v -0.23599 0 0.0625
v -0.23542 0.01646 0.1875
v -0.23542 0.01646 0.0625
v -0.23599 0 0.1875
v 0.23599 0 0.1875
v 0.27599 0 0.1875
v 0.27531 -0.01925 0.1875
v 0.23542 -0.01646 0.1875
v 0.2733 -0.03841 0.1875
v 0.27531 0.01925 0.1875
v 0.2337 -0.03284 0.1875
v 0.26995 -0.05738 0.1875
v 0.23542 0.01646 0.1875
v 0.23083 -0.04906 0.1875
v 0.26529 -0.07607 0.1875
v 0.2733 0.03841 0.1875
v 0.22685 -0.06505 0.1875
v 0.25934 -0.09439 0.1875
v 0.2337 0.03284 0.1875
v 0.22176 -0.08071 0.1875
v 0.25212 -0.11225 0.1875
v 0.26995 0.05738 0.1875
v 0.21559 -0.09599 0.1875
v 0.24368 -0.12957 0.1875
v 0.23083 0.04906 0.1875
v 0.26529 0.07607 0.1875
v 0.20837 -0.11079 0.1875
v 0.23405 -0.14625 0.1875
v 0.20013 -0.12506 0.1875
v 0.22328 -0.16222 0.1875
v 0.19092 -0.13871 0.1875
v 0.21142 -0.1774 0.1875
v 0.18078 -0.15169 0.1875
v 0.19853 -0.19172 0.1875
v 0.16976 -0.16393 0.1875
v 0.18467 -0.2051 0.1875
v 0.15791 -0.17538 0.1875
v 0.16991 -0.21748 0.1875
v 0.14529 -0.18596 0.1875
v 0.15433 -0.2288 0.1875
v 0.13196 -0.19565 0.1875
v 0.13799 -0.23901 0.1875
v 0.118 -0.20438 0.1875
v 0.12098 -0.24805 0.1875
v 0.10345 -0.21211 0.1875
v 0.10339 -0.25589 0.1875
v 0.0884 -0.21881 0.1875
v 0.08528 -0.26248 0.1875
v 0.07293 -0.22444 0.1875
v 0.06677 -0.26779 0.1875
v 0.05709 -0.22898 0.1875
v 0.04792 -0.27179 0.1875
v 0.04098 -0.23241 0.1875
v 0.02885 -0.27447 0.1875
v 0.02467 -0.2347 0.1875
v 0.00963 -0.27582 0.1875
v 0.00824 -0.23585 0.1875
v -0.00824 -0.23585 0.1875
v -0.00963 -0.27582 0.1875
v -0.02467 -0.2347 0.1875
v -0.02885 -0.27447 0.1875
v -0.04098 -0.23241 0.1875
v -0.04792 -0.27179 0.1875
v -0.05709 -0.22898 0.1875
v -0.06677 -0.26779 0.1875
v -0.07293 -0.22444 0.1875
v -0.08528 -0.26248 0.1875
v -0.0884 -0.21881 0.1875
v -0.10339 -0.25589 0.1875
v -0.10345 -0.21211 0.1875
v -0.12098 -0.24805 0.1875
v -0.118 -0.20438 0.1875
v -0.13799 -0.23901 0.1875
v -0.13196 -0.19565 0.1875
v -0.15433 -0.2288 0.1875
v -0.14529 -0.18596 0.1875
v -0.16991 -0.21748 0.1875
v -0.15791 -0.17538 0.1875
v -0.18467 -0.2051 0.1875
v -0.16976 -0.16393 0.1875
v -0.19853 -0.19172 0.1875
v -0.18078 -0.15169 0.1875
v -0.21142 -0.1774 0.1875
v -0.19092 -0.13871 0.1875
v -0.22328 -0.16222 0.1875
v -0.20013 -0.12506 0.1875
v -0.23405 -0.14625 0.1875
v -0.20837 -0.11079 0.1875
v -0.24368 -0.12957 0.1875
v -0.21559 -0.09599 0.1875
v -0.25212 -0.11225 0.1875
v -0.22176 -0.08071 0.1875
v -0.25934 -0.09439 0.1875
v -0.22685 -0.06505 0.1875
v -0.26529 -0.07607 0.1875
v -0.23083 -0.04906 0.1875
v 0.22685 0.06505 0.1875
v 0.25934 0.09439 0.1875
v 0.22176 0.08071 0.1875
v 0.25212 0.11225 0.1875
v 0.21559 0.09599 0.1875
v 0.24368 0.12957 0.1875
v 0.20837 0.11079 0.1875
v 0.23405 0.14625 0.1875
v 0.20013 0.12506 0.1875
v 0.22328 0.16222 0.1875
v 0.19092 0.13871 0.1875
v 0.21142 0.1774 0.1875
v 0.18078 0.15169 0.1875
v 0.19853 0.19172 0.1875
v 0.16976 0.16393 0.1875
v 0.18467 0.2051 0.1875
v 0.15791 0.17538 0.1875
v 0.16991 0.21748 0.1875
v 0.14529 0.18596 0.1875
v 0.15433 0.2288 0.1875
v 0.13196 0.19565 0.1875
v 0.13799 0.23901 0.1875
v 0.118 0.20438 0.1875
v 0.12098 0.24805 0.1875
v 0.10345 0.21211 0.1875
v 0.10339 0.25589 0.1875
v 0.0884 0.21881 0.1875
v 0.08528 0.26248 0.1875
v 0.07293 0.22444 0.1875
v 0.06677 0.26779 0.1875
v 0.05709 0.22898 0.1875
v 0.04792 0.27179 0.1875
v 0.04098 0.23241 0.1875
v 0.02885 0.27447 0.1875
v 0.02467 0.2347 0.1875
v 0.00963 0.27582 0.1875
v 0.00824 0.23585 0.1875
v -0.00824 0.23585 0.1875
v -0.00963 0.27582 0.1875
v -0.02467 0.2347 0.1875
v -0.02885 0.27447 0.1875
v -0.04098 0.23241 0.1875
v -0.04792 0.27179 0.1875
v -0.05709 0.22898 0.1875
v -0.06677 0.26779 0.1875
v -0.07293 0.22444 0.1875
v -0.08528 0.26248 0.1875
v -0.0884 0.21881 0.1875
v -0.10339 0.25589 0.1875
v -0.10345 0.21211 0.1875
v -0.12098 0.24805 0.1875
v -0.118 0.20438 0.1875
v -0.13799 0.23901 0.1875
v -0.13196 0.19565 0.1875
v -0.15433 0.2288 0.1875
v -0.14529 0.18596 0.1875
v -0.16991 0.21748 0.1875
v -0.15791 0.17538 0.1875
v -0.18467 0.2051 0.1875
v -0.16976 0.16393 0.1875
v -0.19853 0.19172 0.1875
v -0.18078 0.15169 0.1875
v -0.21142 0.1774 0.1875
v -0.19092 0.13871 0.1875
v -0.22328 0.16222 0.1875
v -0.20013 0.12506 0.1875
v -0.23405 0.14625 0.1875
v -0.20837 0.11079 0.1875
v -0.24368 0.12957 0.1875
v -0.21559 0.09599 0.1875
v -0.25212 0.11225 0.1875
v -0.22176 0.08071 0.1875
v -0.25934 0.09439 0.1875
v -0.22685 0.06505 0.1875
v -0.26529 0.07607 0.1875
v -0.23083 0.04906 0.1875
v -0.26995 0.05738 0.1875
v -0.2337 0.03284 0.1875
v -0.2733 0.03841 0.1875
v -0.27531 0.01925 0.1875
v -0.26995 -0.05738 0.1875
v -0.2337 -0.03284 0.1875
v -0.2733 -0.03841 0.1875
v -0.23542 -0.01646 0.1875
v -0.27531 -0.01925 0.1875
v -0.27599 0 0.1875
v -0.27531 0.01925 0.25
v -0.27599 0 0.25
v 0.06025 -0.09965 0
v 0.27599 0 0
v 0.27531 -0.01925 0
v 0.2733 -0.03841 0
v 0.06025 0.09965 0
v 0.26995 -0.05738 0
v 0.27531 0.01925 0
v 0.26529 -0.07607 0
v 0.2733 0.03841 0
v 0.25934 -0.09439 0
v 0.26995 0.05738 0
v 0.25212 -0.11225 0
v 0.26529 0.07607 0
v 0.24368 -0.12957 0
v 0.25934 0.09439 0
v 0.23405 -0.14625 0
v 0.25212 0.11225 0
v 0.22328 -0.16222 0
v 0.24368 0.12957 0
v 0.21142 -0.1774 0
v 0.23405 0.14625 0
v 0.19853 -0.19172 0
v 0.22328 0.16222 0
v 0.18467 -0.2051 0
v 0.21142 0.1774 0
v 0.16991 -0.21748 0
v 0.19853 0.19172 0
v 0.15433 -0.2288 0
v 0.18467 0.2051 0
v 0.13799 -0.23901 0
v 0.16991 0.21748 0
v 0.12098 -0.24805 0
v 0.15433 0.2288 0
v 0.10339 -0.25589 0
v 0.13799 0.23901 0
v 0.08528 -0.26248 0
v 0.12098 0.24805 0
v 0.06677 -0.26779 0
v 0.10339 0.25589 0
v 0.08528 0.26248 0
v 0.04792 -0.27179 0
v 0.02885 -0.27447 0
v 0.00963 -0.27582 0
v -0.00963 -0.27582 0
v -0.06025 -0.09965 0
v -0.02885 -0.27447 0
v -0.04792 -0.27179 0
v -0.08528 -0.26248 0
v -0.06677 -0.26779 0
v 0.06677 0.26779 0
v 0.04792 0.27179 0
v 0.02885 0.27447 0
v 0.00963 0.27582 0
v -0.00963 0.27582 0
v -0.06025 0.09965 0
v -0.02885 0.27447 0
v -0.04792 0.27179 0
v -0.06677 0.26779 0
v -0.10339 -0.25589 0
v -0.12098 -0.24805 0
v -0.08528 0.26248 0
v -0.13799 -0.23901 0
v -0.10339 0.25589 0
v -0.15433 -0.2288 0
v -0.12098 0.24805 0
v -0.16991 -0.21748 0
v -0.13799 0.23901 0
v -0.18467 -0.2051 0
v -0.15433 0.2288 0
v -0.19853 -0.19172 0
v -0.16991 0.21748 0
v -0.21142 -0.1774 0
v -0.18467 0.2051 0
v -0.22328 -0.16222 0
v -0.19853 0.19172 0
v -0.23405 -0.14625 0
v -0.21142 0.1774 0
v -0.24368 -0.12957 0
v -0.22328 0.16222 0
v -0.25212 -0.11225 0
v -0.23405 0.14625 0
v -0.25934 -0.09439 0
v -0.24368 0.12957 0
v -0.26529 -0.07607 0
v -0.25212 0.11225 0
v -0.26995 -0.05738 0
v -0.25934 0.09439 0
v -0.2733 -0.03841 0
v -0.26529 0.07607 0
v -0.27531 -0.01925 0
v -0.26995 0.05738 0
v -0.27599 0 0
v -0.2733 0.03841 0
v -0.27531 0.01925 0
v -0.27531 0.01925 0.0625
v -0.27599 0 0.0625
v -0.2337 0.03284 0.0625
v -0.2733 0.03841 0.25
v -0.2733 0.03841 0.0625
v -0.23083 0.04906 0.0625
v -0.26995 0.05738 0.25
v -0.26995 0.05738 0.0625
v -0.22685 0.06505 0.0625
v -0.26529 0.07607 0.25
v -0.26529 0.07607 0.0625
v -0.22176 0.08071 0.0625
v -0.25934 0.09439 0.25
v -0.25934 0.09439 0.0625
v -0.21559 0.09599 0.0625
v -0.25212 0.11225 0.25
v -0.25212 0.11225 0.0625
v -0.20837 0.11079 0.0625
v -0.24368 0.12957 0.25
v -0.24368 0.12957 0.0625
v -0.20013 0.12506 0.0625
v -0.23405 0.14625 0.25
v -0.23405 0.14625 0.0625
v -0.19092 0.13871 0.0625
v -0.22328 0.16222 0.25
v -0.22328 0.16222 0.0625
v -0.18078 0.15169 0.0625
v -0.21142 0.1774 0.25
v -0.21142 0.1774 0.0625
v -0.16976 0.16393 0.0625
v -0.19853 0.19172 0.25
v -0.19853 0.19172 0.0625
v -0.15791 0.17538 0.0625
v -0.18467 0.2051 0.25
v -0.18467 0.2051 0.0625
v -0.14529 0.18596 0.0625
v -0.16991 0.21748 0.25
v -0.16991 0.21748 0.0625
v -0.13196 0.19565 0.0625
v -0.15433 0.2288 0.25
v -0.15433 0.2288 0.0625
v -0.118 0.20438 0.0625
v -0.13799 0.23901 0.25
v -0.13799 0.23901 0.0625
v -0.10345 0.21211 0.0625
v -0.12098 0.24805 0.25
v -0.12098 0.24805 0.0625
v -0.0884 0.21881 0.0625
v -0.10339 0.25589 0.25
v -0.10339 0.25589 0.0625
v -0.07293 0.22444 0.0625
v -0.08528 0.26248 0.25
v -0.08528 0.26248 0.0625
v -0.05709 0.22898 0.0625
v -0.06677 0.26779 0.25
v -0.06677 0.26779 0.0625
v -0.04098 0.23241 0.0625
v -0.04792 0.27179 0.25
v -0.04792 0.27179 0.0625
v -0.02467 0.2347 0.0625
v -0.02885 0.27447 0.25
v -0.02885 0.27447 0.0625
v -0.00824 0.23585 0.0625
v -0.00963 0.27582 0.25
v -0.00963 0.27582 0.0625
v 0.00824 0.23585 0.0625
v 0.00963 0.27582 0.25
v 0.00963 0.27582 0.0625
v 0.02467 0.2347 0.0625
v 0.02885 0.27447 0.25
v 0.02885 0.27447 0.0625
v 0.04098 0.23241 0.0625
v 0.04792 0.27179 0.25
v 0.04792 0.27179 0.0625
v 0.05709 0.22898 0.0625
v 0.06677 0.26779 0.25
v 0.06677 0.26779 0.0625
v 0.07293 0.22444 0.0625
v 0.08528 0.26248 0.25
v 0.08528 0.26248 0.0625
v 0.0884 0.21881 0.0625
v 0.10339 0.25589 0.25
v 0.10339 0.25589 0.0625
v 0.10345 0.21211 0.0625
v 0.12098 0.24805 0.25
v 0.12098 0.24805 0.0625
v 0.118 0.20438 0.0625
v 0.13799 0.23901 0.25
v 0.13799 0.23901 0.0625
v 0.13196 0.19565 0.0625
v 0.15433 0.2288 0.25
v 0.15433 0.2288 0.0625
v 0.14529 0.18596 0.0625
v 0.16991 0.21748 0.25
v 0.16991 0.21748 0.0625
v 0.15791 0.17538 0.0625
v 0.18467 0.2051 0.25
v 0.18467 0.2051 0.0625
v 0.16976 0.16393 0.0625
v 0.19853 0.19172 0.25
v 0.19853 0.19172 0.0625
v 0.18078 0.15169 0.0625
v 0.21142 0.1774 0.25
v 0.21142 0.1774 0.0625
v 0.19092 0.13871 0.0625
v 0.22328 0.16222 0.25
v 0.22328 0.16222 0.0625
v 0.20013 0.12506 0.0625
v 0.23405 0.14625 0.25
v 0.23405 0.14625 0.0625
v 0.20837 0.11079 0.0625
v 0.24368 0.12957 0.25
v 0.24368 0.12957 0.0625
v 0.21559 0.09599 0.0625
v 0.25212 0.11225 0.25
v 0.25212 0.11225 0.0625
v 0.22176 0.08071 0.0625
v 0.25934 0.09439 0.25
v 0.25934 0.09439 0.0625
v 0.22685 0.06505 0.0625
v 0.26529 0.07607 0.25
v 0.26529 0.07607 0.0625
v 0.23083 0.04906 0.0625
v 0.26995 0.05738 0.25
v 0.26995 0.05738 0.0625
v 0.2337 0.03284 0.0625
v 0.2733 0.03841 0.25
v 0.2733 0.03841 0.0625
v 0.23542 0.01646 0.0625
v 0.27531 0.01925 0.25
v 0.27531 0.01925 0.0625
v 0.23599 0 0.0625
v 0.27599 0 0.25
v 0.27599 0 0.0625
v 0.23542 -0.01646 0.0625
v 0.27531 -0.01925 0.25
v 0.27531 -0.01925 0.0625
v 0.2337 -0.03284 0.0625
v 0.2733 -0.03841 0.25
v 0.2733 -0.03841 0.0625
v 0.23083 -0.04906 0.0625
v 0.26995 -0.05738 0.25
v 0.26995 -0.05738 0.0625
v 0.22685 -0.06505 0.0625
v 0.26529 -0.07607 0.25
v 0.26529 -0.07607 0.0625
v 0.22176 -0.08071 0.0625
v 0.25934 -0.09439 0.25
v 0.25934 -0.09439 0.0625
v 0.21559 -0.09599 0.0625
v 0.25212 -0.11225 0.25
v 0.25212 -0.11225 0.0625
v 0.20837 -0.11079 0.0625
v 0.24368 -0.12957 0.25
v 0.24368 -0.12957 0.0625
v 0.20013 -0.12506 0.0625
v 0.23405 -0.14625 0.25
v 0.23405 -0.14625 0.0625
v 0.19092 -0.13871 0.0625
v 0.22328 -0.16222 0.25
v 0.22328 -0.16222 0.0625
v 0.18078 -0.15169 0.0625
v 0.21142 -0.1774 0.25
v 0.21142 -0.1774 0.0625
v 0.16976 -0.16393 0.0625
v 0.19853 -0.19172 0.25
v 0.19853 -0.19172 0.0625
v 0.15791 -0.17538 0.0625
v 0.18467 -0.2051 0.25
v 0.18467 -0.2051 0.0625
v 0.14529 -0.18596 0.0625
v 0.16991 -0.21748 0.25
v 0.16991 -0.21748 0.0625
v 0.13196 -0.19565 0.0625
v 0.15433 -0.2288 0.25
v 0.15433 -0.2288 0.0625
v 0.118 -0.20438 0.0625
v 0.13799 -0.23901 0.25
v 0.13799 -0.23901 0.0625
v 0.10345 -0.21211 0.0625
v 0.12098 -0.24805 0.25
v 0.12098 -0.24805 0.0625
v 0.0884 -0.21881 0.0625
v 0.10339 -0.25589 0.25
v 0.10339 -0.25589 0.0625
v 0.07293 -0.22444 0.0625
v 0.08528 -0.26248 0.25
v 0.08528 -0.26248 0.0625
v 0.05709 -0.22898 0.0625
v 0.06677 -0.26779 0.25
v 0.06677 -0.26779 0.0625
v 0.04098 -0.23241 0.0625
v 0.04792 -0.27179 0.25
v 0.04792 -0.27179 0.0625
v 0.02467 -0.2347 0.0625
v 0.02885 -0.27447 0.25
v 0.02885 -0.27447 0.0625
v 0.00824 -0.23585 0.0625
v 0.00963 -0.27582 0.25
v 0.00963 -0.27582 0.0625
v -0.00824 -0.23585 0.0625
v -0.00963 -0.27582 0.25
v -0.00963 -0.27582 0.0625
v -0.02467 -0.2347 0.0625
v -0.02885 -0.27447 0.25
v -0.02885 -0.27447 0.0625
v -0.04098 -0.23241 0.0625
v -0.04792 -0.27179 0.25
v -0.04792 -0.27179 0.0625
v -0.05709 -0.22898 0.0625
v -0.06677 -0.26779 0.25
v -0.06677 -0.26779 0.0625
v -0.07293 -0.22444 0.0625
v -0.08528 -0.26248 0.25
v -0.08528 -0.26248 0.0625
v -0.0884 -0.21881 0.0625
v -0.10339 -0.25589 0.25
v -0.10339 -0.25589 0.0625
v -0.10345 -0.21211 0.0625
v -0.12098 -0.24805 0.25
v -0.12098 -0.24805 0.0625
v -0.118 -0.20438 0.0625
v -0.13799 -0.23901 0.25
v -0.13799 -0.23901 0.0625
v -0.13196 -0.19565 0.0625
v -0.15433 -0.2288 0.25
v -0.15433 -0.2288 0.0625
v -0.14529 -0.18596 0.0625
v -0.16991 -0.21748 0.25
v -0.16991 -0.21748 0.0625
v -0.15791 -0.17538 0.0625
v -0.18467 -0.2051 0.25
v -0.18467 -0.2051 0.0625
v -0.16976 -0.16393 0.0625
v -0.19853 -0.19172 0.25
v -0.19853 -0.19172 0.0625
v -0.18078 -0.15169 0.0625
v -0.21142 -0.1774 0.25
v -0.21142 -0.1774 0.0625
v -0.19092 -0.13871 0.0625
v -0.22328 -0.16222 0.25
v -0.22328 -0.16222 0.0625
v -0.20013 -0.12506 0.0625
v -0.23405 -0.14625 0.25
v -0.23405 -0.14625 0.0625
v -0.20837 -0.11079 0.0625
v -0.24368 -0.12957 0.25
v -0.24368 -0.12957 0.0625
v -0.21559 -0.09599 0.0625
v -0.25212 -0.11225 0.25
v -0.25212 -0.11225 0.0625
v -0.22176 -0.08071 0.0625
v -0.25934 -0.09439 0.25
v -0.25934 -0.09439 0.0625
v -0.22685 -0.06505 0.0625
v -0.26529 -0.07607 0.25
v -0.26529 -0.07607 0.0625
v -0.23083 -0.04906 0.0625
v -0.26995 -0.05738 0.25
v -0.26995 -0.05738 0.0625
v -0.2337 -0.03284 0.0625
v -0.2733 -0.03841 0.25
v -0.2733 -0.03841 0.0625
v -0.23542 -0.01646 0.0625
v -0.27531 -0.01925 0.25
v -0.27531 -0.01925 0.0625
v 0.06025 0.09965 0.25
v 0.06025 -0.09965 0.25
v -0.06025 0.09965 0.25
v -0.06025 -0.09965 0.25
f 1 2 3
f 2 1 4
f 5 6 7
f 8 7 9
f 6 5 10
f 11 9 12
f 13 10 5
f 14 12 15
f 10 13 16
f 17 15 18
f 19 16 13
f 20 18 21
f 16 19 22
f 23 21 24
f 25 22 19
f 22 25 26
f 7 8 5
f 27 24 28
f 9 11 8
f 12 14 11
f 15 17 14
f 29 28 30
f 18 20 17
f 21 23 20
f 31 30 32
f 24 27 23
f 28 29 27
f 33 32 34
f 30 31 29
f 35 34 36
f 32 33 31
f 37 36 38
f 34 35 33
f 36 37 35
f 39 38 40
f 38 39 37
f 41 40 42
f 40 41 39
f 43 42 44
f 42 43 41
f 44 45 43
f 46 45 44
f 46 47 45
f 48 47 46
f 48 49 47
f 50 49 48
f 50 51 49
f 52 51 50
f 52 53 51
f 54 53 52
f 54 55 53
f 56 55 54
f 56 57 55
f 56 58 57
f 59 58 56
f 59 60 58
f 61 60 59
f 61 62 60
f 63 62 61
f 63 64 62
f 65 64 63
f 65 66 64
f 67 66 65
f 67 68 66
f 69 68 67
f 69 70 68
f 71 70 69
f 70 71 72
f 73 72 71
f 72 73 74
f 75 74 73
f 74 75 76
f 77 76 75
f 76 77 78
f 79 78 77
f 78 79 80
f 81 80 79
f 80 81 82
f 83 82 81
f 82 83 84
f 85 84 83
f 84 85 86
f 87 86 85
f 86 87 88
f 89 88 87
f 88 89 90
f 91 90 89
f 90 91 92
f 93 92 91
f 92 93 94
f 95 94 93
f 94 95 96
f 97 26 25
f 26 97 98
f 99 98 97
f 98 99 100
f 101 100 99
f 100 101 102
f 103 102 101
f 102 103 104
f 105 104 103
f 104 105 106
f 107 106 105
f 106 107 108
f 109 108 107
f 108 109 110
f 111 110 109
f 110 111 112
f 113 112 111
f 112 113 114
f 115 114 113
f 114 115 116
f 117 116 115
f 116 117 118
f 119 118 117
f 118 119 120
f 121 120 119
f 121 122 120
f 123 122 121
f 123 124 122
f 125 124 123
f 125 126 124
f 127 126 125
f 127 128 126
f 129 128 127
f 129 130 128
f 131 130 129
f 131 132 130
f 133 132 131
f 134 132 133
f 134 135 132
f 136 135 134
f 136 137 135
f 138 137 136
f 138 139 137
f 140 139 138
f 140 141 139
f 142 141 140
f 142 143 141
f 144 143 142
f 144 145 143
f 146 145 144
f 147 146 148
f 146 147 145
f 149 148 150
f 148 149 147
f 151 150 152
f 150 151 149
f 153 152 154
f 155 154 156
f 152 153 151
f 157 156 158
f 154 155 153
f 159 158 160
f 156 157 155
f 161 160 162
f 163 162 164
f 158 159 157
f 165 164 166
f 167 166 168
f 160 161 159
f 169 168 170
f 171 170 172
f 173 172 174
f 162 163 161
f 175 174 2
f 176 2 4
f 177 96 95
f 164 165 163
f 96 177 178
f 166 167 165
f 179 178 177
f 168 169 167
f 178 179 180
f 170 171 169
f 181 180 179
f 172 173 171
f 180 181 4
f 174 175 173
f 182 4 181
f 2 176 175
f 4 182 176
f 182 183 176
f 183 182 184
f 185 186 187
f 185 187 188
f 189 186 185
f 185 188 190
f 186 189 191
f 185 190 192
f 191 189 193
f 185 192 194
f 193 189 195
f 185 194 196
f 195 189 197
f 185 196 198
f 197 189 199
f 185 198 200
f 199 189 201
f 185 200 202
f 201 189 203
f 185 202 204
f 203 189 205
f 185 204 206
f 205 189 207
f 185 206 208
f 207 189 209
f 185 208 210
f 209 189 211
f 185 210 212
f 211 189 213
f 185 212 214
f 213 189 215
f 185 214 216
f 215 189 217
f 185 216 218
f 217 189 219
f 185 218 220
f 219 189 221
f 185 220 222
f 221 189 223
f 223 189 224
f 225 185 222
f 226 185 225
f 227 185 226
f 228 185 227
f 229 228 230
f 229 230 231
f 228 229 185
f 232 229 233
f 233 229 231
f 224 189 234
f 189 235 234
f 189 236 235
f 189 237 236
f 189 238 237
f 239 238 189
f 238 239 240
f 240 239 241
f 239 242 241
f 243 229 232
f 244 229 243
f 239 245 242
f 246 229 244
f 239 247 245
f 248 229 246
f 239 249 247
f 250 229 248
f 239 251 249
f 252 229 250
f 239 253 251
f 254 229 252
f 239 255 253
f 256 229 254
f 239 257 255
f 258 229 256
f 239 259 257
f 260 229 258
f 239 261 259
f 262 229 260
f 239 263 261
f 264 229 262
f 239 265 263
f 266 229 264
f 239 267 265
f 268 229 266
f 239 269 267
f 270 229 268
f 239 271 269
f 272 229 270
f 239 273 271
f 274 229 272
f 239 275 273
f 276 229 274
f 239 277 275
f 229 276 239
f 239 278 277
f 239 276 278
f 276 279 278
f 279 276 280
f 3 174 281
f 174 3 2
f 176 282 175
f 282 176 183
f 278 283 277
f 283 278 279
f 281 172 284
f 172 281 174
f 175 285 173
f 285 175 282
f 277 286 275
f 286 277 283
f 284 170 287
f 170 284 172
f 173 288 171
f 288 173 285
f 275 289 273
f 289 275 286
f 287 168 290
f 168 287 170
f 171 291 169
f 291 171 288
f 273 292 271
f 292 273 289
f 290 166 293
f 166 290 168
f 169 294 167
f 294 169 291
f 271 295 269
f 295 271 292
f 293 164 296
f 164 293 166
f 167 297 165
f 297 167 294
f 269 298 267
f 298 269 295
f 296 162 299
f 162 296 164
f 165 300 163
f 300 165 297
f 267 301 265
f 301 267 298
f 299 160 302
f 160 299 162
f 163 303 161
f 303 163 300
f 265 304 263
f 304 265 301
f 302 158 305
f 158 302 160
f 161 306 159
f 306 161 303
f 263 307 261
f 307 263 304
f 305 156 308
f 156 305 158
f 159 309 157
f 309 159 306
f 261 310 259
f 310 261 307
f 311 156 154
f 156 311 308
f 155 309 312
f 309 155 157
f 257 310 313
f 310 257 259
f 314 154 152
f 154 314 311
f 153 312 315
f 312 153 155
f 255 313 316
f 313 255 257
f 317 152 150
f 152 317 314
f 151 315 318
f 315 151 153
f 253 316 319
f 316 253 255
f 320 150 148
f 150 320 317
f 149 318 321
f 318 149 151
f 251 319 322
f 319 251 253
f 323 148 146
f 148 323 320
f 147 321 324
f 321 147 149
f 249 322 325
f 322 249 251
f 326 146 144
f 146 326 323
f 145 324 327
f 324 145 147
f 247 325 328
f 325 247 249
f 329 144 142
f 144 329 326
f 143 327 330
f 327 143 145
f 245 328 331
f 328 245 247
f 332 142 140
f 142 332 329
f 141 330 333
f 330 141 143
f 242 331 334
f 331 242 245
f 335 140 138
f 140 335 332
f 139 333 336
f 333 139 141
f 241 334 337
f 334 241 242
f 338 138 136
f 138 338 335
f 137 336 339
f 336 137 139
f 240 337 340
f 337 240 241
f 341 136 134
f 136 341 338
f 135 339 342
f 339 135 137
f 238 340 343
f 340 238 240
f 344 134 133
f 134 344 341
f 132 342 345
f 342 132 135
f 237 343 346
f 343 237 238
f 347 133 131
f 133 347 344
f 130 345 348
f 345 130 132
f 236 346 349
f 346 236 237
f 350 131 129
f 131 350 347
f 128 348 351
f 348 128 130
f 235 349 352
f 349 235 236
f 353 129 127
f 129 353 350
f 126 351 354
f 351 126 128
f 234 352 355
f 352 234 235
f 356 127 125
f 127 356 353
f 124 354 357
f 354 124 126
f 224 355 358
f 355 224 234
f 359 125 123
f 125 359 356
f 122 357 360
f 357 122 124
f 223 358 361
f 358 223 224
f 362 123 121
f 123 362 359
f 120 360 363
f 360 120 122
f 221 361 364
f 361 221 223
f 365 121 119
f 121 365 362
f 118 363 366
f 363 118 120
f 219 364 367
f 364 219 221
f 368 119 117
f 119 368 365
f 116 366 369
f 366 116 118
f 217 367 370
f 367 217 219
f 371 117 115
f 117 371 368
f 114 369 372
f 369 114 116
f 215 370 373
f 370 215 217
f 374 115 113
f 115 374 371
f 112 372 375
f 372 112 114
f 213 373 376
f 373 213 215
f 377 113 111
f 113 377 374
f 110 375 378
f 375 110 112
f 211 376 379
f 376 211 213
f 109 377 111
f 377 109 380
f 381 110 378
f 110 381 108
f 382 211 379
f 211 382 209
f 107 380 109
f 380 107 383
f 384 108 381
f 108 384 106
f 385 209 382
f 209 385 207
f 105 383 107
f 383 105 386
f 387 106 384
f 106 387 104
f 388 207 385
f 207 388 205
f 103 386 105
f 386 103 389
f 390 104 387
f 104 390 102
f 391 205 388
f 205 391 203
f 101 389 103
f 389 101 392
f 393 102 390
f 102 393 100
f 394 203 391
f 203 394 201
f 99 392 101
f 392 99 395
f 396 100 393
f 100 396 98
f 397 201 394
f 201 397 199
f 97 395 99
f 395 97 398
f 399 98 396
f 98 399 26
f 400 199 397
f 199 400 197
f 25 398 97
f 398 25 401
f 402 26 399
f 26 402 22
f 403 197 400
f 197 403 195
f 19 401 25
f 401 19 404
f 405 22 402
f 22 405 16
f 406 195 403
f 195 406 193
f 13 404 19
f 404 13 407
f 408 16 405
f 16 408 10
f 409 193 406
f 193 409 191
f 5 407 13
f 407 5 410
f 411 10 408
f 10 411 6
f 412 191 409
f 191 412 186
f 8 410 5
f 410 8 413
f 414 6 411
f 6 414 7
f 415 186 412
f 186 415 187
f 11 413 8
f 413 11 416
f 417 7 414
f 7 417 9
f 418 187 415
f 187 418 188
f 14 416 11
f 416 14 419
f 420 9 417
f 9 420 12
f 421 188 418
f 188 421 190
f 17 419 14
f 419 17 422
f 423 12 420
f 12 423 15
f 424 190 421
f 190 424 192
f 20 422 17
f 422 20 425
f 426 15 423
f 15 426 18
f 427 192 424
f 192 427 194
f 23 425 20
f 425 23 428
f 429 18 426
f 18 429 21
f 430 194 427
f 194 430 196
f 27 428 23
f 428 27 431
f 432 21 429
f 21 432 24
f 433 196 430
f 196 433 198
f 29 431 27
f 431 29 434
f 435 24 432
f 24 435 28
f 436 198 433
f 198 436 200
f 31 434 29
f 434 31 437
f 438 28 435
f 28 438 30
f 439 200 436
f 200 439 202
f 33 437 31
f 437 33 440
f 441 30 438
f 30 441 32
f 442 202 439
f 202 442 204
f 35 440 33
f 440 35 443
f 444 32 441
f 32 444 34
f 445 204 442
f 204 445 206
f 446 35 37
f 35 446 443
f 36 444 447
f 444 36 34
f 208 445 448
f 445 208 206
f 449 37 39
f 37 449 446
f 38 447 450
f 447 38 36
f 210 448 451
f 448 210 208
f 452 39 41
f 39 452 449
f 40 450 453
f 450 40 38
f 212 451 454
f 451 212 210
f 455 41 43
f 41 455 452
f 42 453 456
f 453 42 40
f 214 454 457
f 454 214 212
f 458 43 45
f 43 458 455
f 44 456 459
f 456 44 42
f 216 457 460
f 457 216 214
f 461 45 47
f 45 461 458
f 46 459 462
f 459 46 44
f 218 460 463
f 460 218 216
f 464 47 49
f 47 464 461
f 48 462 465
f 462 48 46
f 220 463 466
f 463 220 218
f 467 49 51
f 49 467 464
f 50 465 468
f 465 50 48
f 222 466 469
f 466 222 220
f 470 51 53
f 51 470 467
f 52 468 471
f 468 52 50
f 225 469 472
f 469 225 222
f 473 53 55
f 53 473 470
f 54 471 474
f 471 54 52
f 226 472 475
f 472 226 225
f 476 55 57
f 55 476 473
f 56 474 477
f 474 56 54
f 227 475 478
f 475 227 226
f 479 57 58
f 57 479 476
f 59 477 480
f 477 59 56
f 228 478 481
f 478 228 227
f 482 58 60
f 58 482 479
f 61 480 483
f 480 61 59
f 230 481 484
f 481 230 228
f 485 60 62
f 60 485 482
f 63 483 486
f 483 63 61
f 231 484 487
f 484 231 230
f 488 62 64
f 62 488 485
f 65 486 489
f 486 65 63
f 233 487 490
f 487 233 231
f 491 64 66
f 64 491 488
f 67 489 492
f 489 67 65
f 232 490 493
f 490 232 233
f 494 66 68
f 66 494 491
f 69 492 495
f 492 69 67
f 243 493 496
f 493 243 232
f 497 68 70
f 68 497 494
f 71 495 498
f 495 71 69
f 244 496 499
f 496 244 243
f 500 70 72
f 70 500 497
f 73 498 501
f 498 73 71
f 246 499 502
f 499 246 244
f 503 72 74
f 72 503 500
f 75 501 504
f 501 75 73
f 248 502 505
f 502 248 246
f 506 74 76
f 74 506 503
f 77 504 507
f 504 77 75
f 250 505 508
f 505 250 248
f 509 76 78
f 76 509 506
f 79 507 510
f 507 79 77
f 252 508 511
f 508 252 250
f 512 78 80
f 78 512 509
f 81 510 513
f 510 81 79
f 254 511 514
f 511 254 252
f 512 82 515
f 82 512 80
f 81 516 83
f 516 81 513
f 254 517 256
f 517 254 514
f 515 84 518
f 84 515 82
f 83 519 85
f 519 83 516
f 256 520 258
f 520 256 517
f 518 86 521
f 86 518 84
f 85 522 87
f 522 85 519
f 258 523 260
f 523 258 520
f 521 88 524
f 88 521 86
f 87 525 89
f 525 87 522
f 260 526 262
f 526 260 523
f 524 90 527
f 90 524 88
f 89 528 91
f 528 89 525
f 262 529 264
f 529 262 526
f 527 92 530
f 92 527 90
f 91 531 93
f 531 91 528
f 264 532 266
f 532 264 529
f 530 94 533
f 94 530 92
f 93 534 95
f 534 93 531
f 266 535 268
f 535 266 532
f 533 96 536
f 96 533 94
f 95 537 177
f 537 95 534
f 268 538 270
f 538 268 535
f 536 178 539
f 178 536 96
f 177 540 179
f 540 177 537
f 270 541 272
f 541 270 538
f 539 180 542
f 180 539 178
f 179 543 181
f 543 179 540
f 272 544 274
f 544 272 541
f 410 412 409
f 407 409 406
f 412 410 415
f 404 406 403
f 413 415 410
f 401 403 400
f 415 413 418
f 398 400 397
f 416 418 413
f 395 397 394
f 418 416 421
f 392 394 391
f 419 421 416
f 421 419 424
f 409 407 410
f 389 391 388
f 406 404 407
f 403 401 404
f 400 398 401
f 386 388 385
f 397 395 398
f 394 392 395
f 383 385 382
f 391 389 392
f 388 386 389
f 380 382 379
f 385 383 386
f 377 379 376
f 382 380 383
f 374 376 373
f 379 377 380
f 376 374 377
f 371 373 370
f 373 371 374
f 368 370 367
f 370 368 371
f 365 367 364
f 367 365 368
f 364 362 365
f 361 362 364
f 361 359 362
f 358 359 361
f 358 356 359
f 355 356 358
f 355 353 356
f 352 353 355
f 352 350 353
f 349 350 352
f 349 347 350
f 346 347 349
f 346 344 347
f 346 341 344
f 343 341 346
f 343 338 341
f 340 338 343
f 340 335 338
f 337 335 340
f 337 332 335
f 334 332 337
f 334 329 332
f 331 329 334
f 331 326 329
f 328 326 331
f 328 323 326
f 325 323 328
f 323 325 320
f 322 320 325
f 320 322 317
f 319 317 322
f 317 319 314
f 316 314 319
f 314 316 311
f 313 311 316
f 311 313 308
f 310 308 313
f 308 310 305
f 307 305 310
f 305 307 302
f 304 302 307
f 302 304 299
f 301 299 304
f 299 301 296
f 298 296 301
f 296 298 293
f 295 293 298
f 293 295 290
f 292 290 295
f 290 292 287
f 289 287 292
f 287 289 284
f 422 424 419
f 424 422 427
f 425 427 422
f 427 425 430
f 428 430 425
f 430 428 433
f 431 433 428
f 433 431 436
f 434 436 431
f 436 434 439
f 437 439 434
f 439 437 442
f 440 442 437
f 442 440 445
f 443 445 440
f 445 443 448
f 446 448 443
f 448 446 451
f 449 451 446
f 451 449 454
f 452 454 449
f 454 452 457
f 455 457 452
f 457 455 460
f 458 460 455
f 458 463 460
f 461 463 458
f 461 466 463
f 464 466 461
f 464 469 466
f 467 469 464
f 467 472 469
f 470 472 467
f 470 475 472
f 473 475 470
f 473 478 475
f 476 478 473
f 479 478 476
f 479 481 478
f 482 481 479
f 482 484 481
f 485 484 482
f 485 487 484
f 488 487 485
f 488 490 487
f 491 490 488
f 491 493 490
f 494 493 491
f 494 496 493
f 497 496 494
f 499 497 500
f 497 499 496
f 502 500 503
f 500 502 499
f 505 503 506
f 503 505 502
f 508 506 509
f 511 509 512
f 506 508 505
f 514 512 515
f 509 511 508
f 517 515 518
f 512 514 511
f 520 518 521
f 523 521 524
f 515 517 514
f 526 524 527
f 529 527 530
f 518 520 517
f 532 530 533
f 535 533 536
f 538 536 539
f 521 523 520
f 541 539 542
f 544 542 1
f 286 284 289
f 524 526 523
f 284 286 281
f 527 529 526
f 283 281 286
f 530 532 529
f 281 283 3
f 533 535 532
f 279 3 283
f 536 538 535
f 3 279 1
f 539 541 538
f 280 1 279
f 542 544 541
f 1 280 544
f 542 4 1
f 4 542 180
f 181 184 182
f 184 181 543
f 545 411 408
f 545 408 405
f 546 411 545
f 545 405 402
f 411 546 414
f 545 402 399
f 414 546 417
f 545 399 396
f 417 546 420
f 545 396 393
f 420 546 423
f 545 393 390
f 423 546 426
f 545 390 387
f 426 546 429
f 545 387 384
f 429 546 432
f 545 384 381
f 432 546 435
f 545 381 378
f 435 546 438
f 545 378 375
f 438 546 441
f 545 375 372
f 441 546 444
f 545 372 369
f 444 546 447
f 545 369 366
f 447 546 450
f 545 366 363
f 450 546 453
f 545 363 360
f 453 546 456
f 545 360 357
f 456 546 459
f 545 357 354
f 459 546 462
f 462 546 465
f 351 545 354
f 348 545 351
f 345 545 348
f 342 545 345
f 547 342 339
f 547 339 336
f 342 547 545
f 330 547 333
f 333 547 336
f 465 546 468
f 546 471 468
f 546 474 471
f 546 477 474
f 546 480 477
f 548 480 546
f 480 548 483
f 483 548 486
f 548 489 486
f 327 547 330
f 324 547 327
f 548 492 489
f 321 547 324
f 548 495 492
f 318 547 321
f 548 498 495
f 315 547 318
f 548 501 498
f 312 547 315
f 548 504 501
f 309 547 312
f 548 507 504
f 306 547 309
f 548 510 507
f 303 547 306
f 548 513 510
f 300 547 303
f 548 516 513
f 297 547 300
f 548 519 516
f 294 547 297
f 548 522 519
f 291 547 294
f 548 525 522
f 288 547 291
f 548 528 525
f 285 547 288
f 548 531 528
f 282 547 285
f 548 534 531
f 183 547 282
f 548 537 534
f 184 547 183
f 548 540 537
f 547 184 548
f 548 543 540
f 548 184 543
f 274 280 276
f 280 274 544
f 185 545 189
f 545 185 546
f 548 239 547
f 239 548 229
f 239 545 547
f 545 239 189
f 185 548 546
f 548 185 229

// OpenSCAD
module kettle_pulley (){
    
OR = .276; //Outer Radius
RH = .0625; // Ridge Height
IR = .236; //Inter Radius
H = .25; // Height (overall) 
SH = .1875; // Spindle Height

//mount opening dimensions

OL = .1205; //Opening Length
OW = .1993; //Opening Width

difference () {

rotate_extrude(convexity= 10 , $fn = 90)
polygon( points=[[0,0],[OR,0],[OR,RH],[IR,RH],[IR,SH],[OR,SH],[OR,H],[0,H]] );

cube (size = [OL, OW, H+.25], center = true); 

//translate ([0, 0, 0])
//cylinder (.125, .125, .125, center = false, $fn = 30);

}
}

kettle_pulley ();
